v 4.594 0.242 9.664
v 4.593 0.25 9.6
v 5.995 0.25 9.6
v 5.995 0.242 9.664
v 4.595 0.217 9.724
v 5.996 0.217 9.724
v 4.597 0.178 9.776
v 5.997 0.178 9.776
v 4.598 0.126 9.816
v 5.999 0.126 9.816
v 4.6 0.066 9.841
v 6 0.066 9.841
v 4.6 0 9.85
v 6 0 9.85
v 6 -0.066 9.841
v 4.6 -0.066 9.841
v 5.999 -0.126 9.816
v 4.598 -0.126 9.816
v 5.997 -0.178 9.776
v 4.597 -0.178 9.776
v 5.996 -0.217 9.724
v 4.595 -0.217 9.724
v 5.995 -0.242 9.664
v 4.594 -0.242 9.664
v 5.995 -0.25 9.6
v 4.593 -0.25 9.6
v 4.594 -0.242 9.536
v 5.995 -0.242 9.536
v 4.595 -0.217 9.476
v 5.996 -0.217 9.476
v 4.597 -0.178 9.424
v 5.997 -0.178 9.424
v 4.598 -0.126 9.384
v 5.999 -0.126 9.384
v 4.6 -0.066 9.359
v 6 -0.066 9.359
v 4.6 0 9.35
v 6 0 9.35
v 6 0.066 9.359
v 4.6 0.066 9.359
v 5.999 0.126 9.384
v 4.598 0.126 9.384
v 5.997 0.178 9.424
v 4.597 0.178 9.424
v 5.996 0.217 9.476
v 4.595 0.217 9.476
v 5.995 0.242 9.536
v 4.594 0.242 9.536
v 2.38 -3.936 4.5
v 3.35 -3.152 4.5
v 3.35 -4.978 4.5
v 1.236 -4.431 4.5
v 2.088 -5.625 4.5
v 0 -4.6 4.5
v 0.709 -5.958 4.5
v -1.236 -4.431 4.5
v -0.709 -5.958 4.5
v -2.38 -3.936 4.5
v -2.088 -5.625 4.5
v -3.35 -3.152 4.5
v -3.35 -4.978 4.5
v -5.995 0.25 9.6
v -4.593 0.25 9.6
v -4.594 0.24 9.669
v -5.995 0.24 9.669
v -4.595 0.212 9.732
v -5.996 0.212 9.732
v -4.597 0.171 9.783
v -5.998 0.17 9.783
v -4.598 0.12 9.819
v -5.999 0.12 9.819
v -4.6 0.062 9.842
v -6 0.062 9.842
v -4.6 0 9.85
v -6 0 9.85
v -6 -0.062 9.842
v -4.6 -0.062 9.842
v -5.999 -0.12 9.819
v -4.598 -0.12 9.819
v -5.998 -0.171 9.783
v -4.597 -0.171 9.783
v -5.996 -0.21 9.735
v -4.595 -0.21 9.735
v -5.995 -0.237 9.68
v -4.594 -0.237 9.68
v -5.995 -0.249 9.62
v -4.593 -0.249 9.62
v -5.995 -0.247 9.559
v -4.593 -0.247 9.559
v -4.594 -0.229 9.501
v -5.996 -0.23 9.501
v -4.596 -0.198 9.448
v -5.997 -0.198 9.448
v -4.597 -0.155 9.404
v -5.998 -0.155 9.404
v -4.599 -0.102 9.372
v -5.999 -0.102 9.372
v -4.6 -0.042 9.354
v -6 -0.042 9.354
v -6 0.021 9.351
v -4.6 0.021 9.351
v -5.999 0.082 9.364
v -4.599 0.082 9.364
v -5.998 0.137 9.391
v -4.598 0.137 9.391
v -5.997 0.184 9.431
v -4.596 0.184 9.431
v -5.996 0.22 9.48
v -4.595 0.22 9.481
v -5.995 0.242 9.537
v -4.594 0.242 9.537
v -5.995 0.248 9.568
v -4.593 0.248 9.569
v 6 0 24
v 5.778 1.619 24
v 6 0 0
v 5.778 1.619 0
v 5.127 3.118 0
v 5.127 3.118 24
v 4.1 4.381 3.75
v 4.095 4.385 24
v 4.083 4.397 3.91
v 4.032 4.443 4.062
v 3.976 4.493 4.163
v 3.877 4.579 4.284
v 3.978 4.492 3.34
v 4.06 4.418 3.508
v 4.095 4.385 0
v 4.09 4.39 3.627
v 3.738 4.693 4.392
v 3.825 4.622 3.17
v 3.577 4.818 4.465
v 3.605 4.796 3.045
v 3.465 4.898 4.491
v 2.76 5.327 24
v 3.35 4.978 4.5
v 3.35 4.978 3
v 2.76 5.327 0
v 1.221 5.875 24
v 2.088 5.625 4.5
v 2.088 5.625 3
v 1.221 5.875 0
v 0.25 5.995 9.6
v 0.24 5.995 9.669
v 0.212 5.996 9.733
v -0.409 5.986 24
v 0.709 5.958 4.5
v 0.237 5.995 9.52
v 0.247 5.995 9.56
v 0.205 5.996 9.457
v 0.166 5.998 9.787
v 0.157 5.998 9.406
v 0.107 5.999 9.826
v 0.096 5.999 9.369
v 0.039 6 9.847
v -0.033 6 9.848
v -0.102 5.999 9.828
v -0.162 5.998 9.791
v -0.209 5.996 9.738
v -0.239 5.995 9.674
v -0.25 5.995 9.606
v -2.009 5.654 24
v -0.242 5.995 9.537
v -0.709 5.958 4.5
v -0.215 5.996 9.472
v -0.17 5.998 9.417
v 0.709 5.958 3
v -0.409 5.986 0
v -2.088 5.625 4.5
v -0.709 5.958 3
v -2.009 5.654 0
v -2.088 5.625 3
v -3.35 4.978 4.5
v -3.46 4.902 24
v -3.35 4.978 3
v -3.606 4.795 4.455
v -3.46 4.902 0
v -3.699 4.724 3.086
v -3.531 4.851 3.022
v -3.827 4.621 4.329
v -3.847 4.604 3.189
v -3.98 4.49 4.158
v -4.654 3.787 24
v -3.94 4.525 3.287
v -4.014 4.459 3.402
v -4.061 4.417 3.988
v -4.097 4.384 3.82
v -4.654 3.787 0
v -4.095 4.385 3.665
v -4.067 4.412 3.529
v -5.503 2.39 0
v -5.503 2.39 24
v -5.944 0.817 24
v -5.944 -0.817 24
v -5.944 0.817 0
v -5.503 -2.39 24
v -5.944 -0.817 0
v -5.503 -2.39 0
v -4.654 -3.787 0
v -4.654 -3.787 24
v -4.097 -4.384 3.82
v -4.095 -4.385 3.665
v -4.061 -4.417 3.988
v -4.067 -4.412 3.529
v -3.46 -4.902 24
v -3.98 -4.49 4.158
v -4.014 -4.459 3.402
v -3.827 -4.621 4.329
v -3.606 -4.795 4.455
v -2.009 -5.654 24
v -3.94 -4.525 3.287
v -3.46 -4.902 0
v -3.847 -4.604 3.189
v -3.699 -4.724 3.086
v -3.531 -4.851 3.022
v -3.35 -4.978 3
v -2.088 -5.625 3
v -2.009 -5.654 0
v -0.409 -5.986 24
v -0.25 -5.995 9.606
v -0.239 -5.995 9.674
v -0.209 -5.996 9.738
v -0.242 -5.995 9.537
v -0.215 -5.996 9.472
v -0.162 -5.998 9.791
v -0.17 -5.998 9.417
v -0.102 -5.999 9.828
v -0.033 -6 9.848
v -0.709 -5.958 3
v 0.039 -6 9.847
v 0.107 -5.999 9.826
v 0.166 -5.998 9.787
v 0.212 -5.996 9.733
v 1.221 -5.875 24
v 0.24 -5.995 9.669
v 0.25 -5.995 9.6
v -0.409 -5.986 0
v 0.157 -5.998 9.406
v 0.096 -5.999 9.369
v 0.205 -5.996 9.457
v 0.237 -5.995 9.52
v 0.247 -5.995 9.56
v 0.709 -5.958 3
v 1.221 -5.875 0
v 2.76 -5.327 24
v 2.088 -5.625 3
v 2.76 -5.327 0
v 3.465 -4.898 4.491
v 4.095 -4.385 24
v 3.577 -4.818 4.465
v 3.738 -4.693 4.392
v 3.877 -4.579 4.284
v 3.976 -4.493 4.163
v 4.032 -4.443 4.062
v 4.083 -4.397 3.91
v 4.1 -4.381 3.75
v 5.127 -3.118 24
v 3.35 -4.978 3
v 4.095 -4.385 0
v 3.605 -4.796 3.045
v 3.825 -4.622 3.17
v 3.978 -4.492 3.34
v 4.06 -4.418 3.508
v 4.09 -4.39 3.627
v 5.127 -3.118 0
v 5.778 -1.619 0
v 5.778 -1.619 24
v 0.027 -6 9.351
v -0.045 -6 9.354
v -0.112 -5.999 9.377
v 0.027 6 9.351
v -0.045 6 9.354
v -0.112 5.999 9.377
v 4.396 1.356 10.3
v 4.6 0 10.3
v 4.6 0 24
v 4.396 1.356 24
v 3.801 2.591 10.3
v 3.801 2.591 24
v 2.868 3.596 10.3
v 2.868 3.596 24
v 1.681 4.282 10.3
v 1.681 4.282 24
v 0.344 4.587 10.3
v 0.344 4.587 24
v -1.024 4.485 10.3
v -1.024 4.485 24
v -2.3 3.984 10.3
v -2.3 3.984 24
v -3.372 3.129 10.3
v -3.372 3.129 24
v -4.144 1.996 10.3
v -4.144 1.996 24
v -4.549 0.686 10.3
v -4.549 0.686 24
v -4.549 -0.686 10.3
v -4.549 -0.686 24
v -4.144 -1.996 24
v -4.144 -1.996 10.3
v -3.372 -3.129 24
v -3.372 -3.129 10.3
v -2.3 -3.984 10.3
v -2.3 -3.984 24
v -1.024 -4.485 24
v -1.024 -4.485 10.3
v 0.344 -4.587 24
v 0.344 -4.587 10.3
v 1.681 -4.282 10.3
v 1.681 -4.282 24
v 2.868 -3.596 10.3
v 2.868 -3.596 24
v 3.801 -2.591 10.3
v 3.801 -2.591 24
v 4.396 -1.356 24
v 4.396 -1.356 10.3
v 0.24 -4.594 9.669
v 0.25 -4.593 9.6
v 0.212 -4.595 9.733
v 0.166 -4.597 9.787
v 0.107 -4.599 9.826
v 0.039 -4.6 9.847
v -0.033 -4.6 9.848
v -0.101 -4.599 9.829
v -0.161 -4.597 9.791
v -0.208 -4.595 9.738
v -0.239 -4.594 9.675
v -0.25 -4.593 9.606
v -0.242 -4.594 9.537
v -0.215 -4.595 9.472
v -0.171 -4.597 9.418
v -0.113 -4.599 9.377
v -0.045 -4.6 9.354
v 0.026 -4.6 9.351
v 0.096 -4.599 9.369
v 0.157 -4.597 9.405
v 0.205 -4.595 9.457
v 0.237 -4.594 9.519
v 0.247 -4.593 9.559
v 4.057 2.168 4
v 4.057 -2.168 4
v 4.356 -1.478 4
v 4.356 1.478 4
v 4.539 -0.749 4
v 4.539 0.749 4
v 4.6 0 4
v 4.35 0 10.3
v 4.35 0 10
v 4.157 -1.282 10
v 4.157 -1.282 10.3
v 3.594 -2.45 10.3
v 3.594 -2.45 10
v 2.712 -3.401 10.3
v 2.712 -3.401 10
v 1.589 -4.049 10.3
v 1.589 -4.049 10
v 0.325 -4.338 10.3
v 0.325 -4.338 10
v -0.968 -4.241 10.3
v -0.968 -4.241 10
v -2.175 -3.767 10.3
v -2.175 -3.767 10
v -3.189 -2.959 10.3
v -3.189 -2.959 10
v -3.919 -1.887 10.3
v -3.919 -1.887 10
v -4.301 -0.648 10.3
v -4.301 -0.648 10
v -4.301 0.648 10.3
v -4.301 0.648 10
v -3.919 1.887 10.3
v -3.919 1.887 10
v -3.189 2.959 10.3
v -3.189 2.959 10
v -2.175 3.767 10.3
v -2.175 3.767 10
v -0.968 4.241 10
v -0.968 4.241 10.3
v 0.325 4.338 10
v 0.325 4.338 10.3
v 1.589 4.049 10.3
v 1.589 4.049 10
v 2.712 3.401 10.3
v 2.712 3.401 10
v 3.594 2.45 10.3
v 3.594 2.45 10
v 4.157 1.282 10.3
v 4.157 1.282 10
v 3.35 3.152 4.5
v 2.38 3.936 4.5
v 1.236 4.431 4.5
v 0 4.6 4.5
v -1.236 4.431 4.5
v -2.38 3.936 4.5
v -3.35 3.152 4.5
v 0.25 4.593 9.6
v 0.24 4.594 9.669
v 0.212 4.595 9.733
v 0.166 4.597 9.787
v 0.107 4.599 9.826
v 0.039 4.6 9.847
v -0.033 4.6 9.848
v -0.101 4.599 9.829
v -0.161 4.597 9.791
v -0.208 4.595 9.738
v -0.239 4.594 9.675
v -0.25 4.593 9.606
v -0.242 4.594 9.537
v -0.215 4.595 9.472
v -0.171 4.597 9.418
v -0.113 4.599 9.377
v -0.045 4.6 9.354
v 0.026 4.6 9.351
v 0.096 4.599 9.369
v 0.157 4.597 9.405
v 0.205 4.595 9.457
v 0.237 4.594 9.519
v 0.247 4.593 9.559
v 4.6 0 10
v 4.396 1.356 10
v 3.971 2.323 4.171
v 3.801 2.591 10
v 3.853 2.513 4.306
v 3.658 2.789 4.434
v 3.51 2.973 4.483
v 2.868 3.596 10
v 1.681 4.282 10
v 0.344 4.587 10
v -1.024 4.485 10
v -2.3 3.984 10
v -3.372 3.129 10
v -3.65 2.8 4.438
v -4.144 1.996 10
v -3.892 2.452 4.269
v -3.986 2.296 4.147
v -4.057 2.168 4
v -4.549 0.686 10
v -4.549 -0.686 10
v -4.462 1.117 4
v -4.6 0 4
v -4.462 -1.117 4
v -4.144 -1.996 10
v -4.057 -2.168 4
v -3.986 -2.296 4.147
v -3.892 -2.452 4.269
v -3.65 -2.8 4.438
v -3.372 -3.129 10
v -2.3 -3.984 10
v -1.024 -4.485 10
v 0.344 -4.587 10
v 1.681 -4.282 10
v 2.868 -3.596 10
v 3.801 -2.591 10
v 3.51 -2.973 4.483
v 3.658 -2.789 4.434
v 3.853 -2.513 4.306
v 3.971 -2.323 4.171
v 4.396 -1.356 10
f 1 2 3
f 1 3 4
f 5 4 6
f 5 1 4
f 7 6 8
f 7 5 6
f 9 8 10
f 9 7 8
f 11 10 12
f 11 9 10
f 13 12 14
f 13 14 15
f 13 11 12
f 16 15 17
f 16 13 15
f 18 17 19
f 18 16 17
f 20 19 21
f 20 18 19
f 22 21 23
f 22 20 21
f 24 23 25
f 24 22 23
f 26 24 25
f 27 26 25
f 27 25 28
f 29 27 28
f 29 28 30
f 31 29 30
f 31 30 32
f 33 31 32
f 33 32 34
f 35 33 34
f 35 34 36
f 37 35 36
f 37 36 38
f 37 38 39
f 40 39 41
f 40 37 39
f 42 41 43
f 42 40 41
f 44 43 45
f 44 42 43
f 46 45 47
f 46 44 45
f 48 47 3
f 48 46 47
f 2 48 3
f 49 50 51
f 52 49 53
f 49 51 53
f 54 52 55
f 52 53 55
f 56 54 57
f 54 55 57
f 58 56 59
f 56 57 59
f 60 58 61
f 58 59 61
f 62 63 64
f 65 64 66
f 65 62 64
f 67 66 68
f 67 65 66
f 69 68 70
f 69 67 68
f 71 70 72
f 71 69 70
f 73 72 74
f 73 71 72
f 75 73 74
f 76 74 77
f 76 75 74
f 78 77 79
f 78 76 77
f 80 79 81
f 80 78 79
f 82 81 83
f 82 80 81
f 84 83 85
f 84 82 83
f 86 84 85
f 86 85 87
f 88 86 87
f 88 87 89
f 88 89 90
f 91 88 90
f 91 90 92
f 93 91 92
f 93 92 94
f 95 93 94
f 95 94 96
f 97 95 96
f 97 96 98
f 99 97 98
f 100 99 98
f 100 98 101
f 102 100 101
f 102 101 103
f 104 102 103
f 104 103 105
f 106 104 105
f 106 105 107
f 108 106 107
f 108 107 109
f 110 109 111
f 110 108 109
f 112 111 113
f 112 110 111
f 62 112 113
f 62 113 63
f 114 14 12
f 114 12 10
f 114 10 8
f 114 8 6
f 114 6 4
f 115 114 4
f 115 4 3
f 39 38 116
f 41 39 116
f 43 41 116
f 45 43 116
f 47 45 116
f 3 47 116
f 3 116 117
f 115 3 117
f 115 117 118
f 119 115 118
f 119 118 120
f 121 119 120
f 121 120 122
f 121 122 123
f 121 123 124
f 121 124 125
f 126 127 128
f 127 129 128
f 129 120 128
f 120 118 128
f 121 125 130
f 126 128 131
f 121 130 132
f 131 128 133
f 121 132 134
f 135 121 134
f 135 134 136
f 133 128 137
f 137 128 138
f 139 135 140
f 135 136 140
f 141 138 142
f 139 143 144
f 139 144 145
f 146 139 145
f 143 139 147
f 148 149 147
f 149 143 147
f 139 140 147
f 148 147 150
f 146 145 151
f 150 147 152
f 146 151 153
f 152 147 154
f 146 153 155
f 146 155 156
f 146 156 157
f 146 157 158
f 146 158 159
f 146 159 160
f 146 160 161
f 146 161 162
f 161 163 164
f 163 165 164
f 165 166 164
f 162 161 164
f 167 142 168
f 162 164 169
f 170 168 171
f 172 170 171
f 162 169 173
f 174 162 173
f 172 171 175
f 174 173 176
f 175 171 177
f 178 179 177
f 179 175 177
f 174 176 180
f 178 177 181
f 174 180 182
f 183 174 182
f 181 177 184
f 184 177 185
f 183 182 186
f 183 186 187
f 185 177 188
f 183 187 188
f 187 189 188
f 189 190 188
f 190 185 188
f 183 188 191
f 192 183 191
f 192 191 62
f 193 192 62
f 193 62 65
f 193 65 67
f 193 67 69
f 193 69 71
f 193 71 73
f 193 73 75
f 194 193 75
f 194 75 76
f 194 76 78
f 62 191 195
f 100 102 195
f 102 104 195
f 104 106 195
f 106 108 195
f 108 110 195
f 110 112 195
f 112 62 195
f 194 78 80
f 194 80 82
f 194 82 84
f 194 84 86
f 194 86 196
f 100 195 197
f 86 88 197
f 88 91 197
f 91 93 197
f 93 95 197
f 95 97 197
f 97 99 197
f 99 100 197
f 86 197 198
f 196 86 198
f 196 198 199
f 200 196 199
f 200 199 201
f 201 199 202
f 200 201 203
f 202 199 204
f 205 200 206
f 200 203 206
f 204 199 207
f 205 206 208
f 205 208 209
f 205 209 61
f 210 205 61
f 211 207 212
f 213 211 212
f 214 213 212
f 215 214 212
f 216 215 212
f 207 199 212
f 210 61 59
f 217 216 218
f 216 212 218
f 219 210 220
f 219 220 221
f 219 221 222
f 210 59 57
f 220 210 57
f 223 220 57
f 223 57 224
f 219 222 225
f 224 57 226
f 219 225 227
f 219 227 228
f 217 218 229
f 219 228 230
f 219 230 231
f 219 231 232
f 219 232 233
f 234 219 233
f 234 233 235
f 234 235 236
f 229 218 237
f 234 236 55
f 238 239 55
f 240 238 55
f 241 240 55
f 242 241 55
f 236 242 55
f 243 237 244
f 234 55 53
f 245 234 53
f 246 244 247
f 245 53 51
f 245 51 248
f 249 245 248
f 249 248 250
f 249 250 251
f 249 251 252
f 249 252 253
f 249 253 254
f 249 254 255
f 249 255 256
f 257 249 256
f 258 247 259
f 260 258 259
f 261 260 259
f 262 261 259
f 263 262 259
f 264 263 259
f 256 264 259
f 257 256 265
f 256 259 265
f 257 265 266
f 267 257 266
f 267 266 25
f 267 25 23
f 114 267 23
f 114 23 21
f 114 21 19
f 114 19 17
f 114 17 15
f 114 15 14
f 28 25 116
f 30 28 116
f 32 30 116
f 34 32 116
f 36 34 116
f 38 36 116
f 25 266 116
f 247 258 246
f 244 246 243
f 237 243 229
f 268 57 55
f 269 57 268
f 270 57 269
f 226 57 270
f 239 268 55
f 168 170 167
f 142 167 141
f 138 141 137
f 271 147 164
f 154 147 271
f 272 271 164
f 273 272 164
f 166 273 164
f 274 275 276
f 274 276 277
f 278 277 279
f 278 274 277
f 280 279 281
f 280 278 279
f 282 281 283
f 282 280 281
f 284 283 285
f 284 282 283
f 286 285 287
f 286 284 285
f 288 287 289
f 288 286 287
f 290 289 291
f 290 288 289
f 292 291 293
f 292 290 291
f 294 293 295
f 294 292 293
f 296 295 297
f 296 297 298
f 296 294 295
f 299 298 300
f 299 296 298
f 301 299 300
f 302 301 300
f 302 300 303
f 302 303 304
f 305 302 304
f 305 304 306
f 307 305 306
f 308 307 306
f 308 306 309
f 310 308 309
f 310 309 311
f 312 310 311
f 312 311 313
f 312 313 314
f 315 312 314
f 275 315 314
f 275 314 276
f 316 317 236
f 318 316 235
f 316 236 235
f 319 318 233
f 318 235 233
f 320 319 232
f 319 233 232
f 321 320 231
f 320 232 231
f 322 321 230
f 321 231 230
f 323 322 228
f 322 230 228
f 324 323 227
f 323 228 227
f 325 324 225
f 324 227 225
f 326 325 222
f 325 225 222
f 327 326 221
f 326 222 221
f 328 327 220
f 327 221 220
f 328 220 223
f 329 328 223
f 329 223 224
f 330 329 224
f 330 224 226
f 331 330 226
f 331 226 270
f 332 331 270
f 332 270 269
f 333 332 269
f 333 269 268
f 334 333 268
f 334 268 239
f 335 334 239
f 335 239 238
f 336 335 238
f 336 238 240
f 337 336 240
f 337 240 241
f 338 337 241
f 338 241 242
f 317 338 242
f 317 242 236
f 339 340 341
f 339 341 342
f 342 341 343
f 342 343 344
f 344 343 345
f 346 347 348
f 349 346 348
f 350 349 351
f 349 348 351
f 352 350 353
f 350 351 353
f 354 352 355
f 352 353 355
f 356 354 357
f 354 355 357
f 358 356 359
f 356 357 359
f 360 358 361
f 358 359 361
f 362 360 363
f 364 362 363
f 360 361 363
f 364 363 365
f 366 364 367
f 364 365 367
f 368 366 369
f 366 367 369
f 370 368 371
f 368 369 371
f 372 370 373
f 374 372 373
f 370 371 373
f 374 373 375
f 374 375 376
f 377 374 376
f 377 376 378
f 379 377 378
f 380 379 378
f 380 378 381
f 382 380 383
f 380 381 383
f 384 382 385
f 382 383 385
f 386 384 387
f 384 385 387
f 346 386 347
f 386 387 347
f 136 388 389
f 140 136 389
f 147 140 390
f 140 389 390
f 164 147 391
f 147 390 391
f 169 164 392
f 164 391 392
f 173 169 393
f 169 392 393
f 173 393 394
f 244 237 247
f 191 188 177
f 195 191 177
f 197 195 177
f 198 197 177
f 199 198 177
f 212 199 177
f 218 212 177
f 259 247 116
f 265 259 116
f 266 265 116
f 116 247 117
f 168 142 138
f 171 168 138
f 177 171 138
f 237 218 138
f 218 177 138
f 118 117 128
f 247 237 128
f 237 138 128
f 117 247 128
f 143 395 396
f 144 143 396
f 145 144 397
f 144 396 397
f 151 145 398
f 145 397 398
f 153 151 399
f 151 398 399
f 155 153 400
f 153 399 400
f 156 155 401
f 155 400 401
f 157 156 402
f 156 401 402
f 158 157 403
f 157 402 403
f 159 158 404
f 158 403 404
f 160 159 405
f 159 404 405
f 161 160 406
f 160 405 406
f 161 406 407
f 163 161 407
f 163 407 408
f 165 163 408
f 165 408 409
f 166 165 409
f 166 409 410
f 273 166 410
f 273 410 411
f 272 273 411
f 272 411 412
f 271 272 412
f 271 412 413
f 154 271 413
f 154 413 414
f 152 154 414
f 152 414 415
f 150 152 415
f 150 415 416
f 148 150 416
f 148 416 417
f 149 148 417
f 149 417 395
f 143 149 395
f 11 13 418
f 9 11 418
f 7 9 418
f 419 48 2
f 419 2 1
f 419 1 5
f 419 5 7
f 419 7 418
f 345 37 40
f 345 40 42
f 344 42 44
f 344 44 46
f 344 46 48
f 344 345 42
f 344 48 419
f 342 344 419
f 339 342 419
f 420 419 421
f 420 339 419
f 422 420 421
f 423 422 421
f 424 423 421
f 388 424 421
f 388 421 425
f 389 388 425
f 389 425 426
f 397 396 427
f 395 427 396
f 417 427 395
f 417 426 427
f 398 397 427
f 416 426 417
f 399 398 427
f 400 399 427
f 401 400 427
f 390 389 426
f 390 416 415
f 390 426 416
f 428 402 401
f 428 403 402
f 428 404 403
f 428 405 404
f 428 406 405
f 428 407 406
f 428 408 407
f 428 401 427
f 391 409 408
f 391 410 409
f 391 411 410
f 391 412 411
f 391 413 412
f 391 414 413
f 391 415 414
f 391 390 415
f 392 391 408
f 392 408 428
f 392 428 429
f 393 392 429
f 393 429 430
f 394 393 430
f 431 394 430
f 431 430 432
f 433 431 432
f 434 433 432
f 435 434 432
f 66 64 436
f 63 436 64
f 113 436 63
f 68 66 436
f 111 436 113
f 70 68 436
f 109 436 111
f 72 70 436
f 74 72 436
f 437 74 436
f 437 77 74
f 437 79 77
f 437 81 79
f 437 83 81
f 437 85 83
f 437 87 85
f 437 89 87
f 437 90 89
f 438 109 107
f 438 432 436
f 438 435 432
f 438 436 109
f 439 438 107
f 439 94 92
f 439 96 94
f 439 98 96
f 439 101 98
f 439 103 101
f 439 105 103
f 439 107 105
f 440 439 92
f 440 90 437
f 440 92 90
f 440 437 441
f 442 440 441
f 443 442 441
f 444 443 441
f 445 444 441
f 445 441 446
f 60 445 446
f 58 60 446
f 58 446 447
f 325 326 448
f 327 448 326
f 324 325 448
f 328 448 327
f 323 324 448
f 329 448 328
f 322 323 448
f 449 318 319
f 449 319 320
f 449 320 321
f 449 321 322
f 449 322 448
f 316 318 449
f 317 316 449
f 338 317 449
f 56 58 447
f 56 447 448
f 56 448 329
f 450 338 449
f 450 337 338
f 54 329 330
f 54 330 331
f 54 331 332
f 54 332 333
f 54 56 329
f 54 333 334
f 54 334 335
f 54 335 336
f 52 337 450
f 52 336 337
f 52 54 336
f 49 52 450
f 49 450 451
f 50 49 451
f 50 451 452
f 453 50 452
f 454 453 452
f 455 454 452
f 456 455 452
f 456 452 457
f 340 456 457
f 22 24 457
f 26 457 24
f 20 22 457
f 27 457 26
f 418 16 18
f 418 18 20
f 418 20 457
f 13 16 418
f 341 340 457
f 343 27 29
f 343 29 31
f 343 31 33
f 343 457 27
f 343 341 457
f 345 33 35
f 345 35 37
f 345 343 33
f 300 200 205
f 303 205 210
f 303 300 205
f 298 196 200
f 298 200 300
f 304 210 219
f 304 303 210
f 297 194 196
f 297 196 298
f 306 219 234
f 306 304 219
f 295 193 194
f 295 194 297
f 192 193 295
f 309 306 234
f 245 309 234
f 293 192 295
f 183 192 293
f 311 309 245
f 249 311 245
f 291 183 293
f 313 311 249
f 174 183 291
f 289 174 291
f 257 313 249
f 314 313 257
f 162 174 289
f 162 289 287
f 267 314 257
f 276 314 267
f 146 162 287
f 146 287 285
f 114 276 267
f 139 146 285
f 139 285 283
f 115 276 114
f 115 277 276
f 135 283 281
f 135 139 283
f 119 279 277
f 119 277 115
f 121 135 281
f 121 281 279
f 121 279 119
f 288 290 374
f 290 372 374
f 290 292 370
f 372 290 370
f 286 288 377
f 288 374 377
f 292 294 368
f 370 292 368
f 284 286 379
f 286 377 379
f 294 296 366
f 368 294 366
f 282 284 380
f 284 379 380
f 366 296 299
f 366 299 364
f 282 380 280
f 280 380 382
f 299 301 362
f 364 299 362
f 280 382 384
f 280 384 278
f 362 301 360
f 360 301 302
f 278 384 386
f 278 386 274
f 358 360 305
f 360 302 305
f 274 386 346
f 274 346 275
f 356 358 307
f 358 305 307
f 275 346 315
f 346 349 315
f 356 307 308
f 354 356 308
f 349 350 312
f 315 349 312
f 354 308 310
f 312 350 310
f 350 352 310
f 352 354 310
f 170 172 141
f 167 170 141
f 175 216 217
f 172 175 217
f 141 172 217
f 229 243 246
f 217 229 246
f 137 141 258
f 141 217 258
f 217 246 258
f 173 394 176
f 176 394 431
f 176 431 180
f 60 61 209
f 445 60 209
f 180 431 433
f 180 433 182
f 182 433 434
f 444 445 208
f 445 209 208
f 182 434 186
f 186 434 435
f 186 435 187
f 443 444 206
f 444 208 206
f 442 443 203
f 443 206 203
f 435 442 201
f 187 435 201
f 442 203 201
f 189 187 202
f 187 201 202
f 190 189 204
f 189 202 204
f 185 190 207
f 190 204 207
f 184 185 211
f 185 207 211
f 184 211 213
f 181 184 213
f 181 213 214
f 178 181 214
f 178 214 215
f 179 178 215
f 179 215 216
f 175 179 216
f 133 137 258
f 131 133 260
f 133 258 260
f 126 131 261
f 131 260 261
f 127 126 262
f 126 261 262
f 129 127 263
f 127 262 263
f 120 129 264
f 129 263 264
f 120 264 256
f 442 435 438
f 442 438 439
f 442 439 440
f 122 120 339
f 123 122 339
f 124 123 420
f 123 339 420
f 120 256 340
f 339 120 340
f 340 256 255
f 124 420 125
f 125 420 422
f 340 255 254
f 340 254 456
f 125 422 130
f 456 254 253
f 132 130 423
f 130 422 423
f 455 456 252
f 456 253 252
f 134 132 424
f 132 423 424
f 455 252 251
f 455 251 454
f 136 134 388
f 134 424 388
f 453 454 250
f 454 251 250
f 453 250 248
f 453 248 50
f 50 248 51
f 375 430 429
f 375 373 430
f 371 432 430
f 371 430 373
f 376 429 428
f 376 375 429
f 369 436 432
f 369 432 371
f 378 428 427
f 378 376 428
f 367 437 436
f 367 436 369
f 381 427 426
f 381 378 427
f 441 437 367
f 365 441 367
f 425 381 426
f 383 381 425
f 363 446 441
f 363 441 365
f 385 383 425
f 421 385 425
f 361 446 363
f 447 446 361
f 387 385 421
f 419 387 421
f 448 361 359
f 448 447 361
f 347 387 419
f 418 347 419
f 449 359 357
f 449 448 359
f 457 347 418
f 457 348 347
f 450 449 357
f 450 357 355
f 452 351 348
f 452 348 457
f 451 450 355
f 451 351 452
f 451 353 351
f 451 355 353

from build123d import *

# Parameters (mm, degrees)
F0_R      = 6
F1_DEPTH  = 4
F2_R      = 6
F2_R_2    = 4.6
F3_DEPTH  = 20
F6_DEPTH  = 25
F8_R      = 4.6
F8_R_2    = 4.35
F9_DEPTH  = 0.3
F10_R     = 0.25
F11_DEPTH = 25
F13_R     = 0.25
F14_DEPTH = 25


with BuildPart() as f1:
    # F0 (on Top) → F1 (new body)
    with BuildSketch(Plane.XY):
        Circle(F0_R)
    extrude(amount=F1_DEPTH)

    # F2 (on face) → F3 (join)
    with BuildSketch(Plane.XY.offset(4)):
        Circle(F2_R)
        Circle(F2_R_2, mode=Mode.SUBTRACT)
    extrude(amount=F3_DEPTH)

    # F5 (on offset) → F6 (cut)
    with BuildSketch(Plane.XZ.offset(10)):
        with BuildLine():
            ThreePointArc((-2.6, 3.75), (-2.8196699141, 4.2803300859), (-3.35, 4.5))
            Line((-3.35, 4.5), (-3.35, 3))
            ThreePointArc((-3.35, 3), (-2.8196699141, 3.2196699141), (-2.6, 3.75))
        make_face()
        with BuildLine():
            Line((3.35, 4.5), (-3.35, 4.5))
            ThreePointArc((-3.35, 4.5), (-2.8196699141, 4.2803300859), (-2.6, 3.75))
            ThreePointArc((-2.6, 3.75), (-2.8196699141, 3.2196699141), (-3.35, 3))
            Line((-3.35, 3), (3.35, 3))
            ThreePointArc((3.35, 3), (2.6, 3.75), (3.35, 4.5))
        make_face()
        with BuildLine():
            Line((-3.35, 3), (-3.35, 4.5))
            ThreePointArc((-3.35, 4.5), (-4.1, 3.75), (-3.35, 3))
        make_face()
        with BuildLine():
            ThreePointArc((4.1, 3.75), (3.8803300859, 4.2803300859), (3.35, 4.5))
            Line((3.35, 4.5), (3.35, 3))
            ThreePointArc((3.35, 3), (3.8803300859, 3.2196699141), (4.1, 3.75))
        make_face()
        with BuildLine():
            Line((3.35, 3), (3.35, 4.5))
            ThreePointArc((3.35, 4.5), (2.6, 3.75), (3.35, 3))
        make_face()
    extrude(amount=-F6_DEPTH, mode=Mode.SUBTRACT)

    # F8 (on offset) → F9 (join)
    with BuildSketch(Plane(origin=(0, 0, 10), x_dir=(1, 0, 0), z_dir=(0, 0, -1))):
        Circle(F8_R)
        Circle(F8_R_2, mode=Mode.SUBTRACT)
    extrude(amount=-F9_DEPTH)

    # F10 (on offset) → F11 (cut)
    with BuildSketch(Plane.XZ.offset(10)):
        with Locations((0, 9.6)):
            Circle(F10_R)
    extrude(amount=-F11_DEPTH, mode=Mode.SUBTRACT)

    # F13 (on offset) → F14 (cut)
    with BuildSketch(Plane.YZ.offset(-15)):
        with Locations((0, 9.6)):
            Circle(F13_R)
    extrude(amount=F14_DEPTH, mode=Mode.SUBTRACT)


solid = f1.part
